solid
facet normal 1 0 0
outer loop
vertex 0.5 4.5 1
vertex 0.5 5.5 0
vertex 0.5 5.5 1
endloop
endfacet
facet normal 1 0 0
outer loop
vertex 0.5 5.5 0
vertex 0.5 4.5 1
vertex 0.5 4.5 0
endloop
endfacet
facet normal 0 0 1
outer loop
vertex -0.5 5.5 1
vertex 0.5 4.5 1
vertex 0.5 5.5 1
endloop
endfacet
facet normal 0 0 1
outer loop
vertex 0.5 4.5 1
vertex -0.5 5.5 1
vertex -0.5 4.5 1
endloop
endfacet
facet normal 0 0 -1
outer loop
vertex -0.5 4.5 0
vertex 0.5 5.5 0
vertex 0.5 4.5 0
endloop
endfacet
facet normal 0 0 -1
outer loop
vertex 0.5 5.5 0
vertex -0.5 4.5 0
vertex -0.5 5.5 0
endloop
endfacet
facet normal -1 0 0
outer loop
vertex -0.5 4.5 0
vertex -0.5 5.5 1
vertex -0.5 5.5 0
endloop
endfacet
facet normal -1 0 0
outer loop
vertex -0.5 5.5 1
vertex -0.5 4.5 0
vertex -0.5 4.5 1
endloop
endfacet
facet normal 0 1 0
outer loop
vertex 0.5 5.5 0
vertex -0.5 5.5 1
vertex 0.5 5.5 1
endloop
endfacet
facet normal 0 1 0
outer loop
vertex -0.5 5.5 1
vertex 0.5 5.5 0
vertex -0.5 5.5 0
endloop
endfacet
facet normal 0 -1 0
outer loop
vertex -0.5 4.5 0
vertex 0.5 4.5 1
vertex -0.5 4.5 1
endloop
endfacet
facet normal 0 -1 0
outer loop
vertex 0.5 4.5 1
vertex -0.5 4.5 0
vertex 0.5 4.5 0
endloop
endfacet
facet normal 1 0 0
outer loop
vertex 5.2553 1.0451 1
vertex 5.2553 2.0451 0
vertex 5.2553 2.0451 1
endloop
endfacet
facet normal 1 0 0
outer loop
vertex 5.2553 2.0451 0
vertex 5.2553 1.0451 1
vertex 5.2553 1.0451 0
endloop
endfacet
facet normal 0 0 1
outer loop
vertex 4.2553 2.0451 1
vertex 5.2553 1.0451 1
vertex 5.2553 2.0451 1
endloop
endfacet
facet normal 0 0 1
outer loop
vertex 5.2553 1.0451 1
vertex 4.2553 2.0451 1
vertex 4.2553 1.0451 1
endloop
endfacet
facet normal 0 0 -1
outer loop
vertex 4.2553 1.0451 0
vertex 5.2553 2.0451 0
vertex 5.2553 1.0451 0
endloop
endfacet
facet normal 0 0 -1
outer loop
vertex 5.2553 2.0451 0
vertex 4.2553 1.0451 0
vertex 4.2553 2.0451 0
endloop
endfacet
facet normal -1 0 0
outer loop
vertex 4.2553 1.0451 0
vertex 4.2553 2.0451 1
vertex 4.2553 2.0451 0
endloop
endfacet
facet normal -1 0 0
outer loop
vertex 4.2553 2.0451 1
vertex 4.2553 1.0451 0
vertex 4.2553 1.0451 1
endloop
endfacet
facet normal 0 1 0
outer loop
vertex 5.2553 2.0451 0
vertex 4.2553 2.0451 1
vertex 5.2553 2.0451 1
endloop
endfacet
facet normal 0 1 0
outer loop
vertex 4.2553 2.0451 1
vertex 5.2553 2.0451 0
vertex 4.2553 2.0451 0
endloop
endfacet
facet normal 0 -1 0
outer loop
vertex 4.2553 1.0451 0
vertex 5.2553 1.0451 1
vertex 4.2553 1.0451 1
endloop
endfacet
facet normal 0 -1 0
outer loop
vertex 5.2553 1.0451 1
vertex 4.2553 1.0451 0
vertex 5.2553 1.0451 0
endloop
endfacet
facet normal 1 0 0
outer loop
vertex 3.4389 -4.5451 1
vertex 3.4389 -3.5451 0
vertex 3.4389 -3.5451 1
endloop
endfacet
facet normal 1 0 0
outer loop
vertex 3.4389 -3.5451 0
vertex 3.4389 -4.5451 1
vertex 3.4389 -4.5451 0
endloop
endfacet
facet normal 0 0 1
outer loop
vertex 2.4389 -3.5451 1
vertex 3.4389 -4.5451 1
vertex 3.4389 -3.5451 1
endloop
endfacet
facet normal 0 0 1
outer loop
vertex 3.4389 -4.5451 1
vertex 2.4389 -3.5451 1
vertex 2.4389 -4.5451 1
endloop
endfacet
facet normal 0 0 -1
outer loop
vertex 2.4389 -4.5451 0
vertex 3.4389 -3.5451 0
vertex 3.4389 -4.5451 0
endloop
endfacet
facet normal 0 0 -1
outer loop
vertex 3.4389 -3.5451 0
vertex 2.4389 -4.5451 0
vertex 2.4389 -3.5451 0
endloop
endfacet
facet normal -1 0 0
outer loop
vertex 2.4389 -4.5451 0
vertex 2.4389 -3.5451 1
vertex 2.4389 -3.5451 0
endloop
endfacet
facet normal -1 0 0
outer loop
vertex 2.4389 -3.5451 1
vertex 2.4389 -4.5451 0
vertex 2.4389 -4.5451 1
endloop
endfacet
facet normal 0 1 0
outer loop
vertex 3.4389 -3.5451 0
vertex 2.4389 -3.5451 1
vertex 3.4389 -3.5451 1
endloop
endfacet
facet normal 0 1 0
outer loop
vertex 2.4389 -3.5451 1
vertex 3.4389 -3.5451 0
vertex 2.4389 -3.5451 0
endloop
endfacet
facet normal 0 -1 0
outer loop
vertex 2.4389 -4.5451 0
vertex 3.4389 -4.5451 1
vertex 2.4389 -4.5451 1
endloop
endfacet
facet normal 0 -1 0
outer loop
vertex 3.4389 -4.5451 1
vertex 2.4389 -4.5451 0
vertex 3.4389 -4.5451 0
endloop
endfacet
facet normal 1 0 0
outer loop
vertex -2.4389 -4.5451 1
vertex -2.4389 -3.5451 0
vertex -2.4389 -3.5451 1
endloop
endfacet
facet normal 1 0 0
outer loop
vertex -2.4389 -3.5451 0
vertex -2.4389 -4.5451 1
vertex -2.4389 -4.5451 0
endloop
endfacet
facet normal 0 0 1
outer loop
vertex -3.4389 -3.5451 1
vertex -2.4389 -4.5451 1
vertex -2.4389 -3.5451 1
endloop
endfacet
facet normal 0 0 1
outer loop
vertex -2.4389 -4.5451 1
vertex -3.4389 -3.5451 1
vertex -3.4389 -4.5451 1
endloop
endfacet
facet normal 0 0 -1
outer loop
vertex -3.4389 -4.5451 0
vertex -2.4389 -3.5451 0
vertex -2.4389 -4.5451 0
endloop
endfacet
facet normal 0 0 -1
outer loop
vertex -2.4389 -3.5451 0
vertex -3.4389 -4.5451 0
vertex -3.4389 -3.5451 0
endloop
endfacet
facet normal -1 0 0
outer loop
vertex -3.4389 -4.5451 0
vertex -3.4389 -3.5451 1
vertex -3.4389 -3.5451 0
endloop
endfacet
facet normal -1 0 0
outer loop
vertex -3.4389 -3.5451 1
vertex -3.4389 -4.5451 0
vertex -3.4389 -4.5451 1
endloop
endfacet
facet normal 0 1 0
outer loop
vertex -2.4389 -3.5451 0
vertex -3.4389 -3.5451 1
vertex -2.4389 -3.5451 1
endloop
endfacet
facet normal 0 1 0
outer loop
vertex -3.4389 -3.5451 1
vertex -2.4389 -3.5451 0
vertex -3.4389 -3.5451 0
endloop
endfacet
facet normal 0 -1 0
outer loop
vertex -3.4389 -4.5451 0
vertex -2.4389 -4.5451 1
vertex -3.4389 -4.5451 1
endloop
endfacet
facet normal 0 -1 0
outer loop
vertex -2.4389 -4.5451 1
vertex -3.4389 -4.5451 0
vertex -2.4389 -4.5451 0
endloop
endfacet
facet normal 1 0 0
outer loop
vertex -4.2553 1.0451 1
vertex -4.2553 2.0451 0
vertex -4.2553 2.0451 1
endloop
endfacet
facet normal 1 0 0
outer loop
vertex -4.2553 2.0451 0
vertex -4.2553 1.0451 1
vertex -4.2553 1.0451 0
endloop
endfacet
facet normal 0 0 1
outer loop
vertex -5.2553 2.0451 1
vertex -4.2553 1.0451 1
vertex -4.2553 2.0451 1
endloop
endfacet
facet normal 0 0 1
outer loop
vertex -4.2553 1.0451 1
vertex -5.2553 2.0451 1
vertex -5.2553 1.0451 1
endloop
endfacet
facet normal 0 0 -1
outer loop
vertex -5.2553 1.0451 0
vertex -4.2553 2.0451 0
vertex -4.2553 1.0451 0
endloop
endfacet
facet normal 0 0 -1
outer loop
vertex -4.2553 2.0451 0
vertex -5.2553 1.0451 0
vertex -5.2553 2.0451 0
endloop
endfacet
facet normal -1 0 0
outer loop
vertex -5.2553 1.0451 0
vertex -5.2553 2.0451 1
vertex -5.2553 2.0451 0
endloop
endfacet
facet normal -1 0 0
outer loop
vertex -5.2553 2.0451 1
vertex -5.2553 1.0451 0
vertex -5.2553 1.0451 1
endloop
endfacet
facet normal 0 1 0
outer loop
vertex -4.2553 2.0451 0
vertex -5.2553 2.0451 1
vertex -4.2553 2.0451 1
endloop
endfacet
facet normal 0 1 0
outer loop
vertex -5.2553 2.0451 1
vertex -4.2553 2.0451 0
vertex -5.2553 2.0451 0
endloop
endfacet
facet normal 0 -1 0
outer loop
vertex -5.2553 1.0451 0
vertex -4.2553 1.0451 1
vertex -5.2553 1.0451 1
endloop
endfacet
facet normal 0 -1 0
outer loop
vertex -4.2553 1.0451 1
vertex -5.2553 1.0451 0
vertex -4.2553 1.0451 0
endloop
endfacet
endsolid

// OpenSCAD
    
    for (i = [0:4]) {
        union() {
            // Draw each cube as a 3D object
            translate([5 * sin(i * 72), 5 * cos(i * 72), 0.5]) cube([1, 1, 1],center=true);
        }
    }

     
